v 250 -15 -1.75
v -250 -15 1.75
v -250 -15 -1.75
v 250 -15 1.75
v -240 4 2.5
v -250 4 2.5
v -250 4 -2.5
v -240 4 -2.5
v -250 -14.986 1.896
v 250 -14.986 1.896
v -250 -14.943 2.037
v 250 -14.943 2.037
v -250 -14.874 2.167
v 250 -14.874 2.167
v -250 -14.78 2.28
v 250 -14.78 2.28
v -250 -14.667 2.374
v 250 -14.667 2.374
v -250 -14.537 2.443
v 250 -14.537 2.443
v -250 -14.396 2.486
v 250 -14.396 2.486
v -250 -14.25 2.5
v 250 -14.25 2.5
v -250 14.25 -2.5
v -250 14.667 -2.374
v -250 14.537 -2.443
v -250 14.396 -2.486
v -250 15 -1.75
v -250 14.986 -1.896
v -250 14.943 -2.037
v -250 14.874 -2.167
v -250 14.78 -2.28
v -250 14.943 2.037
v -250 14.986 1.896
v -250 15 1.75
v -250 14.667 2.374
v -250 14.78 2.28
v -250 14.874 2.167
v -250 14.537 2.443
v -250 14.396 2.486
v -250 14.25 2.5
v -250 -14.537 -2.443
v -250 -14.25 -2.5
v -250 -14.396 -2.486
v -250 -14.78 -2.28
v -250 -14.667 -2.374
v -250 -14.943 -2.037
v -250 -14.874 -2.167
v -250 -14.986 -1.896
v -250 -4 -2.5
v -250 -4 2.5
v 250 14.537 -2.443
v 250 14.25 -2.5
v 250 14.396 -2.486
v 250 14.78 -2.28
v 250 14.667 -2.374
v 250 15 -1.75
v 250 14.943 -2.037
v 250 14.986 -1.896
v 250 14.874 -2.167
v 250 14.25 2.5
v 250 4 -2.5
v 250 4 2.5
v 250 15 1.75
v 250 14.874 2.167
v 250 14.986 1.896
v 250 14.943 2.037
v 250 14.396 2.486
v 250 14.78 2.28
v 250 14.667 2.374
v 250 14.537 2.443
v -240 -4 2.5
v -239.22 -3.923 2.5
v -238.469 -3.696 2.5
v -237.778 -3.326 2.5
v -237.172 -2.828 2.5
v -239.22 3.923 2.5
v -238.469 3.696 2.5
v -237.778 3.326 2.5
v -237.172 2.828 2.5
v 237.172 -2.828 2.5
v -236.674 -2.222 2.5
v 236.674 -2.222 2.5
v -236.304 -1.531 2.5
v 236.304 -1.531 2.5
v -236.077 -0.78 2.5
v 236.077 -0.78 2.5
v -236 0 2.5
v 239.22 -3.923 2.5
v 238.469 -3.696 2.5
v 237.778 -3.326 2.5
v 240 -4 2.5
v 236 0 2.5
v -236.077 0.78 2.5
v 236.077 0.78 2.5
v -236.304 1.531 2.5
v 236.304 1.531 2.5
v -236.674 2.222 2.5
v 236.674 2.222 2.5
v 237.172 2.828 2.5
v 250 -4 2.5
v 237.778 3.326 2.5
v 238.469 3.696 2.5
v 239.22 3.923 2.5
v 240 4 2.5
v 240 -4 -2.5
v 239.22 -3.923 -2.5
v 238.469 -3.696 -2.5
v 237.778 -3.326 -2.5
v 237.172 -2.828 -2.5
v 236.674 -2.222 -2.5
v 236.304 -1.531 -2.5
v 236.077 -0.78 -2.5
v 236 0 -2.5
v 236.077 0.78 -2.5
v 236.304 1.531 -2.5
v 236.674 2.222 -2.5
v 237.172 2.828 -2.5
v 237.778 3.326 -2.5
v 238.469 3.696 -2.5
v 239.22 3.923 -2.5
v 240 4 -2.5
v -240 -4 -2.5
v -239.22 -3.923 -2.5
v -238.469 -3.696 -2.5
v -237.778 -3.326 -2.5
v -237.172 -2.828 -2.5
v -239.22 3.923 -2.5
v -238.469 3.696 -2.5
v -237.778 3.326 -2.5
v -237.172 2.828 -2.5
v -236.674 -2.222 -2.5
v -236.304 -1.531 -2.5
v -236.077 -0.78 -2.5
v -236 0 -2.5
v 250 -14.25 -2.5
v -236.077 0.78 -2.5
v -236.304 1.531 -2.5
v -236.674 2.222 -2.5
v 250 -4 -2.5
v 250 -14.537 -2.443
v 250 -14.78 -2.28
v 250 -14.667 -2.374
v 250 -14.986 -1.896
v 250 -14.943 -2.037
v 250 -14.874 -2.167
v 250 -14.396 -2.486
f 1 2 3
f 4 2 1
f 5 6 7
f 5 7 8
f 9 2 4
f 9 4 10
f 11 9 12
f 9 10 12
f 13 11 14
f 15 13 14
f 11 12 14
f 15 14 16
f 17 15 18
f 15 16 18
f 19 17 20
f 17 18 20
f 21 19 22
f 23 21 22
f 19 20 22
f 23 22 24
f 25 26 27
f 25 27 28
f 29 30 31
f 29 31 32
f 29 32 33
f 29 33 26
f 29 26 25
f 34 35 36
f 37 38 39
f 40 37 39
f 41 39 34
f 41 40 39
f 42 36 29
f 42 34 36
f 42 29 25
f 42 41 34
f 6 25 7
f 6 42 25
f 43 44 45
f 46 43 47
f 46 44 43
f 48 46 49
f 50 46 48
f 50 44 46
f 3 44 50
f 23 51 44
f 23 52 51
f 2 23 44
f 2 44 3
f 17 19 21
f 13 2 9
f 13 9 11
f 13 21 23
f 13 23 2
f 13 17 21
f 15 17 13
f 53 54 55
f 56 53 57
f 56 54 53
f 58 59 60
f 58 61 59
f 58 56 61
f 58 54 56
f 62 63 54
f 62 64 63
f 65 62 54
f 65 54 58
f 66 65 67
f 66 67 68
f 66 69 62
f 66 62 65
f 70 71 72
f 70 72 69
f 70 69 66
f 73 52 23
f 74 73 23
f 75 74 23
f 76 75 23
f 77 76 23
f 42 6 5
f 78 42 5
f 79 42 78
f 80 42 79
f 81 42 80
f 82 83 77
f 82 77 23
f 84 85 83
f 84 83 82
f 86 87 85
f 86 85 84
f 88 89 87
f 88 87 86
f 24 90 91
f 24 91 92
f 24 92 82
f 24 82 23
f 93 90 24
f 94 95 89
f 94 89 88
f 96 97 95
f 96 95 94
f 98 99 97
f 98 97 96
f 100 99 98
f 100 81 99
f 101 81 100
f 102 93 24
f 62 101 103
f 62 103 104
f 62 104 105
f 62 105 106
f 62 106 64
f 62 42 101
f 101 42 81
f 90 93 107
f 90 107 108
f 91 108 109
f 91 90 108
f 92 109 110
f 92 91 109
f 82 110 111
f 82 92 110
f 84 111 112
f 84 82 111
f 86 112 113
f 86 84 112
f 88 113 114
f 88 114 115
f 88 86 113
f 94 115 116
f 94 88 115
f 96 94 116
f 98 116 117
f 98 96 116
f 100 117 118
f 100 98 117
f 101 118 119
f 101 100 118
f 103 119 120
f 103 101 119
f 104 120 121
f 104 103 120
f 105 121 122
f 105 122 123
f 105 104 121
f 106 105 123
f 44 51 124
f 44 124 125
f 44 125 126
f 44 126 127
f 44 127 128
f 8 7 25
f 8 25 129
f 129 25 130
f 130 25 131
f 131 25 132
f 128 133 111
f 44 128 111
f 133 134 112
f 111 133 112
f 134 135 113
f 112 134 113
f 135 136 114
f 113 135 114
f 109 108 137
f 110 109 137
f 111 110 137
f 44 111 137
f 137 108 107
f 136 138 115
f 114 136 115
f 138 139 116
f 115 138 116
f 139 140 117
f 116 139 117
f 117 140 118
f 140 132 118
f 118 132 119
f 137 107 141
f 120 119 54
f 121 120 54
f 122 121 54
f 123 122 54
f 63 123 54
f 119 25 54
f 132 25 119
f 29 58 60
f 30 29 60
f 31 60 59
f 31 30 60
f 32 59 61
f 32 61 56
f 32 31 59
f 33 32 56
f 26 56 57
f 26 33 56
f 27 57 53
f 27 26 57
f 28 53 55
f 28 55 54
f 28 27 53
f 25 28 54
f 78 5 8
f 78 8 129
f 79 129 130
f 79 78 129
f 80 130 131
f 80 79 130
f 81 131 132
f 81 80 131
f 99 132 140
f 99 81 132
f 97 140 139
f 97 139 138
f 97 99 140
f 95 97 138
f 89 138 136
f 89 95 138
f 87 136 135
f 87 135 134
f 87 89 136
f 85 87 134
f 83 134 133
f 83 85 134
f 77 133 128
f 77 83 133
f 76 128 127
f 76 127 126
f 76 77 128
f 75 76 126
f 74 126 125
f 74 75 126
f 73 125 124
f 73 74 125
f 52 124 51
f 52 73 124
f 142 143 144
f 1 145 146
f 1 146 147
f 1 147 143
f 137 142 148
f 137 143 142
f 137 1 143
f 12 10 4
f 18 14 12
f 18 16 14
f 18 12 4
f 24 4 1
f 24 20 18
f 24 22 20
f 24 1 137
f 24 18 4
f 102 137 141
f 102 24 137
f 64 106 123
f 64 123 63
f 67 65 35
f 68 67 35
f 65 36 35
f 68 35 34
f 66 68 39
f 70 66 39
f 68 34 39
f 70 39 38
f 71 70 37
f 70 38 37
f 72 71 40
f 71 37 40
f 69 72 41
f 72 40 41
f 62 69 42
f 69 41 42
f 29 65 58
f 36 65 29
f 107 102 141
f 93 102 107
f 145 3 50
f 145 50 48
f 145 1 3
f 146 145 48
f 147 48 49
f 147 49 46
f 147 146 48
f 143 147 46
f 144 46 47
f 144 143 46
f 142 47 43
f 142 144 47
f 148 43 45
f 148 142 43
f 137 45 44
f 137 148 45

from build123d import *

# Parameters (mm, degrees)
BOSS_EXTRUDE1_DEPTH = 2.5
FILLET2_R           = 0.75


with BuildPart() as part:
    # Sketch1 → Boss-Extrude1 (new, symmetric)
    with BuildSketch(Plane.XY):
        with BuildLine():
            Line((-250, -15), (250, -15))
            Line((250, -15), (250, -4))
            Line((250, -4), (239.999999107, -4))
            ThreePointArc((239.999999107, -4), (235.999999107, 4.47e-07), (240, 4))
            Line((240, 4), (250, 4))
            Line((250, 4), (250, 15))
            Line((250, 15), (-250, 15))
            Line((-250, 15), (-250, 4))
            Line((-250, 4), (-240, 4))
            ThreePointArc((-240, 4), (-236, 0), (-240, -4))
            Line((-240, -4), (-250, -4))
            Line((-250, -4), (-250, -15))
        make_face()
    extrude(amount=BOSS_EXTRUDE1_DEPTH, both=True)

    # Fillet2
    fillet2_edges = [part.edges().sort_by_distance(p)[0] for p in [
        (0, -15, -2.5),
        (0, 15, -2.5),
        (0, -15, 2.5),
        (0, 15, 2.5),
    ]]
    fillet(fillet2_edges, radius=FILLET2_R)


solid = part.part
